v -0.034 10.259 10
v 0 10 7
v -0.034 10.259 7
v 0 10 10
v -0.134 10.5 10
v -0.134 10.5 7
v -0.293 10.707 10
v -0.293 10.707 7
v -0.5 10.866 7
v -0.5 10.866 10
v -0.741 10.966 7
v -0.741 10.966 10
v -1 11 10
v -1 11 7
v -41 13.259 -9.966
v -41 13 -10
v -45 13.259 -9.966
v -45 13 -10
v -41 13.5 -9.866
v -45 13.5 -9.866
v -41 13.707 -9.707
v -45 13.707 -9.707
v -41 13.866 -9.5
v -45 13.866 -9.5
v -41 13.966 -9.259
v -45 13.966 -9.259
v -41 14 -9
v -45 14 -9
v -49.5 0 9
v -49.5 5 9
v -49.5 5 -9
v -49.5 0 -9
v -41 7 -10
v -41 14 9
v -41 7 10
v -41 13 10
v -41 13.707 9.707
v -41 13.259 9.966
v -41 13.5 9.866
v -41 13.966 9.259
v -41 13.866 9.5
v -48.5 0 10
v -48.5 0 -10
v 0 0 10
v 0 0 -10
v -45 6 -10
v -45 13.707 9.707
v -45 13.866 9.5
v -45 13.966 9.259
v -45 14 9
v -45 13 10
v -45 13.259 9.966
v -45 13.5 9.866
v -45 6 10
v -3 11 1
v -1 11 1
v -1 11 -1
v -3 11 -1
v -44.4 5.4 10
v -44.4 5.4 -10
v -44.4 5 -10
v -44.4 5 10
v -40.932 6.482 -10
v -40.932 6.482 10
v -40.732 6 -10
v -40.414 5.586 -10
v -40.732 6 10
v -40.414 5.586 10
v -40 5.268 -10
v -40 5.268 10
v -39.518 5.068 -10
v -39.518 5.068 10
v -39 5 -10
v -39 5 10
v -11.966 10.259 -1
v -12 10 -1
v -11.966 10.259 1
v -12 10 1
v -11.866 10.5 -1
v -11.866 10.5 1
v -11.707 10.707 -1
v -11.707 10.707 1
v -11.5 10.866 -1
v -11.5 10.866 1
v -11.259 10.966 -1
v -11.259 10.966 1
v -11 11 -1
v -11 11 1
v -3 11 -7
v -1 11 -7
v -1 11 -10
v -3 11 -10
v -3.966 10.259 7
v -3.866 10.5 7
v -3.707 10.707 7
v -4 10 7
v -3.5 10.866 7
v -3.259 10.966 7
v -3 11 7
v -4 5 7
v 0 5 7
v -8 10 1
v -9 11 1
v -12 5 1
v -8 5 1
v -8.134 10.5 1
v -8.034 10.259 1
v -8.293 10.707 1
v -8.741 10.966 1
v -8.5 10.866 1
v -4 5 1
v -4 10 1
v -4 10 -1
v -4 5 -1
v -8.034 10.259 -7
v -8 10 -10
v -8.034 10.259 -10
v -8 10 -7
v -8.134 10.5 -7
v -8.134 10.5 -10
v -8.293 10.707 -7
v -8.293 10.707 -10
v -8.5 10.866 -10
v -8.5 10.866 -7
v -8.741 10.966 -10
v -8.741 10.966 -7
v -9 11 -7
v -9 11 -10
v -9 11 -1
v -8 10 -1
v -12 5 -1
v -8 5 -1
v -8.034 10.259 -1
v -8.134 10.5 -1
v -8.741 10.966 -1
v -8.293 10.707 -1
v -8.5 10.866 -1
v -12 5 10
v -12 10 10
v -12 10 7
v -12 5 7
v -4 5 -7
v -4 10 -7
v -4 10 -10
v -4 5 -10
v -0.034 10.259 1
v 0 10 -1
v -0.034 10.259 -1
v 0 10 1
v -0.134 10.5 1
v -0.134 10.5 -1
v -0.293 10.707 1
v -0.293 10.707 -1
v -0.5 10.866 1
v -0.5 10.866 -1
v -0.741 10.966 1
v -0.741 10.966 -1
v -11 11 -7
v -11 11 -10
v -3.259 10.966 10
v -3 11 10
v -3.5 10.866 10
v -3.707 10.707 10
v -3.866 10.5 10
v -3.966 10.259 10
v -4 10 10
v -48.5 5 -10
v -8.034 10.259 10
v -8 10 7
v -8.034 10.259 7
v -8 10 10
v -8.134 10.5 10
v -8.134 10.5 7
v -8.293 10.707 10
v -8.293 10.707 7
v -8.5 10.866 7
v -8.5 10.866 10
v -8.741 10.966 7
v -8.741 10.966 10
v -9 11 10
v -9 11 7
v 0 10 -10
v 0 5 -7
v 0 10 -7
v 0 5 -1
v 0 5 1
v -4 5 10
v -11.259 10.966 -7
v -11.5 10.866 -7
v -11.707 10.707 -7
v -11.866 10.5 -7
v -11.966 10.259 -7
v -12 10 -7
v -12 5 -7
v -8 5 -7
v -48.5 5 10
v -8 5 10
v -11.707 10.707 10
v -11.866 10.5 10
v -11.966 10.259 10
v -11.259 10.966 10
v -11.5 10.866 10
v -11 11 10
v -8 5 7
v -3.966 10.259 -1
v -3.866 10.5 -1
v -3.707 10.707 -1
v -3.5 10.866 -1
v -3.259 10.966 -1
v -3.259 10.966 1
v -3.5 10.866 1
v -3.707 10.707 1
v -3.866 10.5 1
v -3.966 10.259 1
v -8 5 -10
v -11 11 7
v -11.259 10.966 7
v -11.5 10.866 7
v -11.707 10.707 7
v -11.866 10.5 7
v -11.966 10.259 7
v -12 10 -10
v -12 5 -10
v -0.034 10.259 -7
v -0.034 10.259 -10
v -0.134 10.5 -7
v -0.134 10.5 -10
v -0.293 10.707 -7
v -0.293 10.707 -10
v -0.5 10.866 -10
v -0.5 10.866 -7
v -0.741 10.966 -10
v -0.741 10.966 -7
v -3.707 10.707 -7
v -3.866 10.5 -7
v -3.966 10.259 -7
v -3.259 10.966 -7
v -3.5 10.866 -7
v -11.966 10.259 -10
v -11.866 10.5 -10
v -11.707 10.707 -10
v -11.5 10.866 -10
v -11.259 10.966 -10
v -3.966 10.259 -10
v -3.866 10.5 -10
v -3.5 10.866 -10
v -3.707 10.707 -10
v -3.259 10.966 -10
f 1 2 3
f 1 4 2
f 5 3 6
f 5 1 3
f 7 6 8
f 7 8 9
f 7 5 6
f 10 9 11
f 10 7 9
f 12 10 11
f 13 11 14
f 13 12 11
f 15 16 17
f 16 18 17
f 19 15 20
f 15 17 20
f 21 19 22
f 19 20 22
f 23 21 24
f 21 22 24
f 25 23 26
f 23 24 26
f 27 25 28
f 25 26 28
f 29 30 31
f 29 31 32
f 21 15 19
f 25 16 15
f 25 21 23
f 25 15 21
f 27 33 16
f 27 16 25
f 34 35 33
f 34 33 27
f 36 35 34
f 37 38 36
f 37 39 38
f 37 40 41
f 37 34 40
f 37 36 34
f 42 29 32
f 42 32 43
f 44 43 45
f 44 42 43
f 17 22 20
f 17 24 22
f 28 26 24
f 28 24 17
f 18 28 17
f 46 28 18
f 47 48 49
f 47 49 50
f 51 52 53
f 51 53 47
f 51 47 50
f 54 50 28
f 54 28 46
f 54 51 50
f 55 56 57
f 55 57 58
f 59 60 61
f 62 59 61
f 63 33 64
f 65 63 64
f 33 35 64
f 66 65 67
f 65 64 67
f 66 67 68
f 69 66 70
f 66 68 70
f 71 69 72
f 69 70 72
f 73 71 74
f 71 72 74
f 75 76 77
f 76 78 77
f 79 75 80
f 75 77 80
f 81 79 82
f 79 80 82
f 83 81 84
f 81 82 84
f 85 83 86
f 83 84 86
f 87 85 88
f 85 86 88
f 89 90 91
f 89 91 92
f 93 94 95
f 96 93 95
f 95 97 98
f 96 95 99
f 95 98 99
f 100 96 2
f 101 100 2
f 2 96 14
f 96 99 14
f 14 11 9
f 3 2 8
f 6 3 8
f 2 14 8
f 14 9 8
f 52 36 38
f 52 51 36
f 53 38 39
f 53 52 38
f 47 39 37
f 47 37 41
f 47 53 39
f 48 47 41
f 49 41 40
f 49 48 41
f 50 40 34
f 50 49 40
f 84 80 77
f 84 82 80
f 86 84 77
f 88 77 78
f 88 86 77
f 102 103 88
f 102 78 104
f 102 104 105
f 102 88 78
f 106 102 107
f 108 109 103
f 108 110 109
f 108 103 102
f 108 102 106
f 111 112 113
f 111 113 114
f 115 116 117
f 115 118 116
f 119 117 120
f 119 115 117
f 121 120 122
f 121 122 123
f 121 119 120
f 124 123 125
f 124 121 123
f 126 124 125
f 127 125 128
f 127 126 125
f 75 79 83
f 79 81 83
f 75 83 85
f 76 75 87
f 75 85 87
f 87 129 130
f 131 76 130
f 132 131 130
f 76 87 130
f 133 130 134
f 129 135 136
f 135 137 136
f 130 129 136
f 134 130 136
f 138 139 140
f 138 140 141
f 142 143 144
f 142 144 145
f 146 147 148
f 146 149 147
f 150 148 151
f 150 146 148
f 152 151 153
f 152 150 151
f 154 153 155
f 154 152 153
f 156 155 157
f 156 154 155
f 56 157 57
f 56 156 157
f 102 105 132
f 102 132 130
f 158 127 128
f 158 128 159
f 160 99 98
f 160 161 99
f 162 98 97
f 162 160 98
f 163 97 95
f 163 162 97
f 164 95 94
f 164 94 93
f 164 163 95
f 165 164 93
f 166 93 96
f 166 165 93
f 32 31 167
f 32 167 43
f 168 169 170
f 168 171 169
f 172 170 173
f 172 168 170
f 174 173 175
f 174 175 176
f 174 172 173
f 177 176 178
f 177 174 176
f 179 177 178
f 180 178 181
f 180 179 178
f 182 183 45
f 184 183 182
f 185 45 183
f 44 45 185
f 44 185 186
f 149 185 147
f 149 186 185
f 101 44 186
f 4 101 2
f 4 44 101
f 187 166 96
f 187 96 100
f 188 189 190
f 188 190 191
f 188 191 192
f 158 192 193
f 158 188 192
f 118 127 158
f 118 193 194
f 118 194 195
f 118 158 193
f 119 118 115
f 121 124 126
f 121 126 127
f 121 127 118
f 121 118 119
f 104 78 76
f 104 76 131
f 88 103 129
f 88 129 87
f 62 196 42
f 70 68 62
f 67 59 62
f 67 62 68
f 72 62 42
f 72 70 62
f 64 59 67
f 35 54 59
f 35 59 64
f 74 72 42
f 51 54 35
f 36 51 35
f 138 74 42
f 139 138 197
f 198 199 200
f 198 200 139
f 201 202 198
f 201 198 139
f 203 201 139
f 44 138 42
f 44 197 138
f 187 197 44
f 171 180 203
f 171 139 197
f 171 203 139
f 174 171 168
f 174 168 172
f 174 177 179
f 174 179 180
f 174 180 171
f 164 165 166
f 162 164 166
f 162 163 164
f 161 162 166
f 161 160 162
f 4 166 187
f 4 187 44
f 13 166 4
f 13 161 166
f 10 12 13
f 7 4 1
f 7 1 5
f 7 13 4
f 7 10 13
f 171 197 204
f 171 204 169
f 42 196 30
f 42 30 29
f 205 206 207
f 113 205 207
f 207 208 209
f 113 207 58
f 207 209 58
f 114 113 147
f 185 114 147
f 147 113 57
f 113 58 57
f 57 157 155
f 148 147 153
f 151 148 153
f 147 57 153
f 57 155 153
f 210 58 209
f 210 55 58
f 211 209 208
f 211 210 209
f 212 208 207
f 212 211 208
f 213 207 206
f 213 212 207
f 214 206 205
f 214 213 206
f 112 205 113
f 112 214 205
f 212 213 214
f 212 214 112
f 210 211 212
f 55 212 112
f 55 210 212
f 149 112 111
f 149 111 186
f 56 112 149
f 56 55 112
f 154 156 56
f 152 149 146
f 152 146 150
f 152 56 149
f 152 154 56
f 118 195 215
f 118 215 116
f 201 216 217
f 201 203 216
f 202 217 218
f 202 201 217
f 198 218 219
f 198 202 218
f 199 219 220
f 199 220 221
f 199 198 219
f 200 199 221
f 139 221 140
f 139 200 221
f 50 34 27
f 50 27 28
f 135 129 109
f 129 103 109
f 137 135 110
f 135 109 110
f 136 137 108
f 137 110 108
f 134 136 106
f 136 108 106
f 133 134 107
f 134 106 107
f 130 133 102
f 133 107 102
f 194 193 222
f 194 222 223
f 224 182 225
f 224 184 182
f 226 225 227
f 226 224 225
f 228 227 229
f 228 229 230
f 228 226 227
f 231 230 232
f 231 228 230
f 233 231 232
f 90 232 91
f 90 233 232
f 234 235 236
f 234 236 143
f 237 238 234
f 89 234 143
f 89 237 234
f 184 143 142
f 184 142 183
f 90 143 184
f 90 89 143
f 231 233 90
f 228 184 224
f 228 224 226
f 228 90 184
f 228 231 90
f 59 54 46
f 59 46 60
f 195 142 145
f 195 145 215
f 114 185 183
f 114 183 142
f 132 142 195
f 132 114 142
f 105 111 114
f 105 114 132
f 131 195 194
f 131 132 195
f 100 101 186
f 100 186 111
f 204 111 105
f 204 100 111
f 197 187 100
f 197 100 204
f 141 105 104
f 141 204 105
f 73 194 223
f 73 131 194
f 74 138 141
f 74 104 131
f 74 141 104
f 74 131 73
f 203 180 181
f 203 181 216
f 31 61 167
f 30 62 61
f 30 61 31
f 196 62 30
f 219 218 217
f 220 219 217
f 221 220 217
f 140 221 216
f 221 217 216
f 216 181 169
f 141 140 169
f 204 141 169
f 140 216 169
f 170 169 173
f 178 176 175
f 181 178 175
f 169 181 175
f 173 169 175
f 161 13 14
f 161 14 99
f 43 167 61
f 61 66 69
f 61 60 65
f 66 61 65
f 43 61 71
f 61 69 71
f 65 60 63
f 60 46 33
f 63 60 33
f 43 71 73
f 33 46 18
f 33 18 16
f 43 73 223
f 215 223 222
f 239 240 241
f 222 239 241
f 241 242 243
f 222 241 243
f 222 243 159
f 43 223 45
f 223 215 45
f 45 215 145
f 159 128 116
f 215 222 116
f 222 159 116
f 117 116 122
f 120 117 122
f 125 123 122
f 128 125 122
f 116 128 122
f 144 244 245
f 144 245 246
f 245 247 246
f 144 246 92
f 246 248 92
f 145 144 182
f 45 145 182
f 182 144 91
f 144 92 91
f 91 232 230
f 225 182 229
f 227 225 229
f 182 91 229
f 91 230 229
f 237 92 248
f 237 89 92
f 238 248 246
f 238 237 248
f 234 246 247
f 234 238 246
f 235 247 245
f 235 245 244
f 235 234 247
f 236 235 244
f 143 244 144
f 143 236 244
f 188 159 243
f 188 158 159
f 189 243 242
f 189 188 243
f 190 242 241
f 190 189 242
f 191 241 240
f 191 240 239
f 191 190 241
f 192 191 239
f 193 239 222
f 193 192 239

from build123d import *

# Parameters (mm, degrees)
P_IDAT_VYSUNUT_M1_DEPTH  = 10
SKICA2_W                 = 12
SKICA2_H                 = 6
ODEBRAT_VYSUNUT_M1_DEPTH = 6
ZAOBLIT1_R               = 1
ZKOSEN_1_SIZE            = 1
ZAOBLIT2_R               = 2
ODEBRAT_VYSUNUT_M2_DEPTH = 56.192843739


with BuildPart() as part:
    # Skica1 → Přidat vysunutím1 (new, symmetric)
    with BuildSketch(Plane.XY):
        Polygon((-49.5, 0), (0, 0), (0, 11), (-4, 11), (-4, 5), (-8, 5), (-8, 11), (-12, 11), (-12, 5), (-41, 5), (-41, 14), (-45, 14), (-45, 5), (-49.5, 5), align=None)
    extrude(amount=P_IDAT_VYSUNUT_M1_DEPTH, both=True)

    # Skica2 → Odebrat vysunutím1 (cut)
    with BuildSketch(Plane(origin=(0, 11, 0), x_dir=(1, 0, 0), z_dir=(0, 1, 0))):
        with Locations((-6, 4)):
            Rectangle(SKICA2_W, SKICA2_H)
        with Locations((-6, -4)):
            Rectangle(SKICA2_W, SKICA2_H)
    extrude(amount=-ODEBRAT_VYSUNUT_M1_DEPTH, mode=Mode.SUBTRACT)

    # Zaoblit1
    zaoblit1_edges = [part.edges().sort_by_distance(p)[0] for p in [
        (-43, 14, -10),
        (-12, 11, 8.5),
        (-8, 11, 8.5),
        (-4, 11, 8.5),
        (0, 11, 8.5),
        (-8, 11, 0),
        (-8, 11, -8.5),
        (-4, 11, 0),
        (-4, 11, -8.5),
        (-43, 14, 10),
        (0, 11, 0),
        (0, 11, -8.5),
        (-12, 11, 0),
        (-12, 11, -8.5),
    ]]
    fillet(zaoblit1_edges, radius=ZAOBLIT1_R)

    # Zkosení1
    zkosen_1_edges = [part.edges().sort_by_distance(p)[0] for p in [
        (-49.5, 2.5, -10),
        (-49.5, 2.5, 10),
    ]]
    chamfer(zkosen_1_edges, length=ZKOSEN_1_SIZE)

    # Zaoblit2
    zaoblit2_edges = [part.edges().sort_by_distance(p)[0] for p in [
        (-41, 5, 0),
    ]]
    fillet(zaoblit2_edges, radius=ZAOBLIT2_R)

    # Skica3 → Odebrat vysunutím2 (cut, through all)
    with BuildSketch(Plane.XY.offset(10)):
        Polygon((-45, 6), (-44.4, 5.4), (-44.4, 5), (-45, 5), align=None)
    extrude(amount=-ODEBRAT_VYSUNUT_M2_DEPTH, mode=Mode.SUBTRACT)


solid = part.part
